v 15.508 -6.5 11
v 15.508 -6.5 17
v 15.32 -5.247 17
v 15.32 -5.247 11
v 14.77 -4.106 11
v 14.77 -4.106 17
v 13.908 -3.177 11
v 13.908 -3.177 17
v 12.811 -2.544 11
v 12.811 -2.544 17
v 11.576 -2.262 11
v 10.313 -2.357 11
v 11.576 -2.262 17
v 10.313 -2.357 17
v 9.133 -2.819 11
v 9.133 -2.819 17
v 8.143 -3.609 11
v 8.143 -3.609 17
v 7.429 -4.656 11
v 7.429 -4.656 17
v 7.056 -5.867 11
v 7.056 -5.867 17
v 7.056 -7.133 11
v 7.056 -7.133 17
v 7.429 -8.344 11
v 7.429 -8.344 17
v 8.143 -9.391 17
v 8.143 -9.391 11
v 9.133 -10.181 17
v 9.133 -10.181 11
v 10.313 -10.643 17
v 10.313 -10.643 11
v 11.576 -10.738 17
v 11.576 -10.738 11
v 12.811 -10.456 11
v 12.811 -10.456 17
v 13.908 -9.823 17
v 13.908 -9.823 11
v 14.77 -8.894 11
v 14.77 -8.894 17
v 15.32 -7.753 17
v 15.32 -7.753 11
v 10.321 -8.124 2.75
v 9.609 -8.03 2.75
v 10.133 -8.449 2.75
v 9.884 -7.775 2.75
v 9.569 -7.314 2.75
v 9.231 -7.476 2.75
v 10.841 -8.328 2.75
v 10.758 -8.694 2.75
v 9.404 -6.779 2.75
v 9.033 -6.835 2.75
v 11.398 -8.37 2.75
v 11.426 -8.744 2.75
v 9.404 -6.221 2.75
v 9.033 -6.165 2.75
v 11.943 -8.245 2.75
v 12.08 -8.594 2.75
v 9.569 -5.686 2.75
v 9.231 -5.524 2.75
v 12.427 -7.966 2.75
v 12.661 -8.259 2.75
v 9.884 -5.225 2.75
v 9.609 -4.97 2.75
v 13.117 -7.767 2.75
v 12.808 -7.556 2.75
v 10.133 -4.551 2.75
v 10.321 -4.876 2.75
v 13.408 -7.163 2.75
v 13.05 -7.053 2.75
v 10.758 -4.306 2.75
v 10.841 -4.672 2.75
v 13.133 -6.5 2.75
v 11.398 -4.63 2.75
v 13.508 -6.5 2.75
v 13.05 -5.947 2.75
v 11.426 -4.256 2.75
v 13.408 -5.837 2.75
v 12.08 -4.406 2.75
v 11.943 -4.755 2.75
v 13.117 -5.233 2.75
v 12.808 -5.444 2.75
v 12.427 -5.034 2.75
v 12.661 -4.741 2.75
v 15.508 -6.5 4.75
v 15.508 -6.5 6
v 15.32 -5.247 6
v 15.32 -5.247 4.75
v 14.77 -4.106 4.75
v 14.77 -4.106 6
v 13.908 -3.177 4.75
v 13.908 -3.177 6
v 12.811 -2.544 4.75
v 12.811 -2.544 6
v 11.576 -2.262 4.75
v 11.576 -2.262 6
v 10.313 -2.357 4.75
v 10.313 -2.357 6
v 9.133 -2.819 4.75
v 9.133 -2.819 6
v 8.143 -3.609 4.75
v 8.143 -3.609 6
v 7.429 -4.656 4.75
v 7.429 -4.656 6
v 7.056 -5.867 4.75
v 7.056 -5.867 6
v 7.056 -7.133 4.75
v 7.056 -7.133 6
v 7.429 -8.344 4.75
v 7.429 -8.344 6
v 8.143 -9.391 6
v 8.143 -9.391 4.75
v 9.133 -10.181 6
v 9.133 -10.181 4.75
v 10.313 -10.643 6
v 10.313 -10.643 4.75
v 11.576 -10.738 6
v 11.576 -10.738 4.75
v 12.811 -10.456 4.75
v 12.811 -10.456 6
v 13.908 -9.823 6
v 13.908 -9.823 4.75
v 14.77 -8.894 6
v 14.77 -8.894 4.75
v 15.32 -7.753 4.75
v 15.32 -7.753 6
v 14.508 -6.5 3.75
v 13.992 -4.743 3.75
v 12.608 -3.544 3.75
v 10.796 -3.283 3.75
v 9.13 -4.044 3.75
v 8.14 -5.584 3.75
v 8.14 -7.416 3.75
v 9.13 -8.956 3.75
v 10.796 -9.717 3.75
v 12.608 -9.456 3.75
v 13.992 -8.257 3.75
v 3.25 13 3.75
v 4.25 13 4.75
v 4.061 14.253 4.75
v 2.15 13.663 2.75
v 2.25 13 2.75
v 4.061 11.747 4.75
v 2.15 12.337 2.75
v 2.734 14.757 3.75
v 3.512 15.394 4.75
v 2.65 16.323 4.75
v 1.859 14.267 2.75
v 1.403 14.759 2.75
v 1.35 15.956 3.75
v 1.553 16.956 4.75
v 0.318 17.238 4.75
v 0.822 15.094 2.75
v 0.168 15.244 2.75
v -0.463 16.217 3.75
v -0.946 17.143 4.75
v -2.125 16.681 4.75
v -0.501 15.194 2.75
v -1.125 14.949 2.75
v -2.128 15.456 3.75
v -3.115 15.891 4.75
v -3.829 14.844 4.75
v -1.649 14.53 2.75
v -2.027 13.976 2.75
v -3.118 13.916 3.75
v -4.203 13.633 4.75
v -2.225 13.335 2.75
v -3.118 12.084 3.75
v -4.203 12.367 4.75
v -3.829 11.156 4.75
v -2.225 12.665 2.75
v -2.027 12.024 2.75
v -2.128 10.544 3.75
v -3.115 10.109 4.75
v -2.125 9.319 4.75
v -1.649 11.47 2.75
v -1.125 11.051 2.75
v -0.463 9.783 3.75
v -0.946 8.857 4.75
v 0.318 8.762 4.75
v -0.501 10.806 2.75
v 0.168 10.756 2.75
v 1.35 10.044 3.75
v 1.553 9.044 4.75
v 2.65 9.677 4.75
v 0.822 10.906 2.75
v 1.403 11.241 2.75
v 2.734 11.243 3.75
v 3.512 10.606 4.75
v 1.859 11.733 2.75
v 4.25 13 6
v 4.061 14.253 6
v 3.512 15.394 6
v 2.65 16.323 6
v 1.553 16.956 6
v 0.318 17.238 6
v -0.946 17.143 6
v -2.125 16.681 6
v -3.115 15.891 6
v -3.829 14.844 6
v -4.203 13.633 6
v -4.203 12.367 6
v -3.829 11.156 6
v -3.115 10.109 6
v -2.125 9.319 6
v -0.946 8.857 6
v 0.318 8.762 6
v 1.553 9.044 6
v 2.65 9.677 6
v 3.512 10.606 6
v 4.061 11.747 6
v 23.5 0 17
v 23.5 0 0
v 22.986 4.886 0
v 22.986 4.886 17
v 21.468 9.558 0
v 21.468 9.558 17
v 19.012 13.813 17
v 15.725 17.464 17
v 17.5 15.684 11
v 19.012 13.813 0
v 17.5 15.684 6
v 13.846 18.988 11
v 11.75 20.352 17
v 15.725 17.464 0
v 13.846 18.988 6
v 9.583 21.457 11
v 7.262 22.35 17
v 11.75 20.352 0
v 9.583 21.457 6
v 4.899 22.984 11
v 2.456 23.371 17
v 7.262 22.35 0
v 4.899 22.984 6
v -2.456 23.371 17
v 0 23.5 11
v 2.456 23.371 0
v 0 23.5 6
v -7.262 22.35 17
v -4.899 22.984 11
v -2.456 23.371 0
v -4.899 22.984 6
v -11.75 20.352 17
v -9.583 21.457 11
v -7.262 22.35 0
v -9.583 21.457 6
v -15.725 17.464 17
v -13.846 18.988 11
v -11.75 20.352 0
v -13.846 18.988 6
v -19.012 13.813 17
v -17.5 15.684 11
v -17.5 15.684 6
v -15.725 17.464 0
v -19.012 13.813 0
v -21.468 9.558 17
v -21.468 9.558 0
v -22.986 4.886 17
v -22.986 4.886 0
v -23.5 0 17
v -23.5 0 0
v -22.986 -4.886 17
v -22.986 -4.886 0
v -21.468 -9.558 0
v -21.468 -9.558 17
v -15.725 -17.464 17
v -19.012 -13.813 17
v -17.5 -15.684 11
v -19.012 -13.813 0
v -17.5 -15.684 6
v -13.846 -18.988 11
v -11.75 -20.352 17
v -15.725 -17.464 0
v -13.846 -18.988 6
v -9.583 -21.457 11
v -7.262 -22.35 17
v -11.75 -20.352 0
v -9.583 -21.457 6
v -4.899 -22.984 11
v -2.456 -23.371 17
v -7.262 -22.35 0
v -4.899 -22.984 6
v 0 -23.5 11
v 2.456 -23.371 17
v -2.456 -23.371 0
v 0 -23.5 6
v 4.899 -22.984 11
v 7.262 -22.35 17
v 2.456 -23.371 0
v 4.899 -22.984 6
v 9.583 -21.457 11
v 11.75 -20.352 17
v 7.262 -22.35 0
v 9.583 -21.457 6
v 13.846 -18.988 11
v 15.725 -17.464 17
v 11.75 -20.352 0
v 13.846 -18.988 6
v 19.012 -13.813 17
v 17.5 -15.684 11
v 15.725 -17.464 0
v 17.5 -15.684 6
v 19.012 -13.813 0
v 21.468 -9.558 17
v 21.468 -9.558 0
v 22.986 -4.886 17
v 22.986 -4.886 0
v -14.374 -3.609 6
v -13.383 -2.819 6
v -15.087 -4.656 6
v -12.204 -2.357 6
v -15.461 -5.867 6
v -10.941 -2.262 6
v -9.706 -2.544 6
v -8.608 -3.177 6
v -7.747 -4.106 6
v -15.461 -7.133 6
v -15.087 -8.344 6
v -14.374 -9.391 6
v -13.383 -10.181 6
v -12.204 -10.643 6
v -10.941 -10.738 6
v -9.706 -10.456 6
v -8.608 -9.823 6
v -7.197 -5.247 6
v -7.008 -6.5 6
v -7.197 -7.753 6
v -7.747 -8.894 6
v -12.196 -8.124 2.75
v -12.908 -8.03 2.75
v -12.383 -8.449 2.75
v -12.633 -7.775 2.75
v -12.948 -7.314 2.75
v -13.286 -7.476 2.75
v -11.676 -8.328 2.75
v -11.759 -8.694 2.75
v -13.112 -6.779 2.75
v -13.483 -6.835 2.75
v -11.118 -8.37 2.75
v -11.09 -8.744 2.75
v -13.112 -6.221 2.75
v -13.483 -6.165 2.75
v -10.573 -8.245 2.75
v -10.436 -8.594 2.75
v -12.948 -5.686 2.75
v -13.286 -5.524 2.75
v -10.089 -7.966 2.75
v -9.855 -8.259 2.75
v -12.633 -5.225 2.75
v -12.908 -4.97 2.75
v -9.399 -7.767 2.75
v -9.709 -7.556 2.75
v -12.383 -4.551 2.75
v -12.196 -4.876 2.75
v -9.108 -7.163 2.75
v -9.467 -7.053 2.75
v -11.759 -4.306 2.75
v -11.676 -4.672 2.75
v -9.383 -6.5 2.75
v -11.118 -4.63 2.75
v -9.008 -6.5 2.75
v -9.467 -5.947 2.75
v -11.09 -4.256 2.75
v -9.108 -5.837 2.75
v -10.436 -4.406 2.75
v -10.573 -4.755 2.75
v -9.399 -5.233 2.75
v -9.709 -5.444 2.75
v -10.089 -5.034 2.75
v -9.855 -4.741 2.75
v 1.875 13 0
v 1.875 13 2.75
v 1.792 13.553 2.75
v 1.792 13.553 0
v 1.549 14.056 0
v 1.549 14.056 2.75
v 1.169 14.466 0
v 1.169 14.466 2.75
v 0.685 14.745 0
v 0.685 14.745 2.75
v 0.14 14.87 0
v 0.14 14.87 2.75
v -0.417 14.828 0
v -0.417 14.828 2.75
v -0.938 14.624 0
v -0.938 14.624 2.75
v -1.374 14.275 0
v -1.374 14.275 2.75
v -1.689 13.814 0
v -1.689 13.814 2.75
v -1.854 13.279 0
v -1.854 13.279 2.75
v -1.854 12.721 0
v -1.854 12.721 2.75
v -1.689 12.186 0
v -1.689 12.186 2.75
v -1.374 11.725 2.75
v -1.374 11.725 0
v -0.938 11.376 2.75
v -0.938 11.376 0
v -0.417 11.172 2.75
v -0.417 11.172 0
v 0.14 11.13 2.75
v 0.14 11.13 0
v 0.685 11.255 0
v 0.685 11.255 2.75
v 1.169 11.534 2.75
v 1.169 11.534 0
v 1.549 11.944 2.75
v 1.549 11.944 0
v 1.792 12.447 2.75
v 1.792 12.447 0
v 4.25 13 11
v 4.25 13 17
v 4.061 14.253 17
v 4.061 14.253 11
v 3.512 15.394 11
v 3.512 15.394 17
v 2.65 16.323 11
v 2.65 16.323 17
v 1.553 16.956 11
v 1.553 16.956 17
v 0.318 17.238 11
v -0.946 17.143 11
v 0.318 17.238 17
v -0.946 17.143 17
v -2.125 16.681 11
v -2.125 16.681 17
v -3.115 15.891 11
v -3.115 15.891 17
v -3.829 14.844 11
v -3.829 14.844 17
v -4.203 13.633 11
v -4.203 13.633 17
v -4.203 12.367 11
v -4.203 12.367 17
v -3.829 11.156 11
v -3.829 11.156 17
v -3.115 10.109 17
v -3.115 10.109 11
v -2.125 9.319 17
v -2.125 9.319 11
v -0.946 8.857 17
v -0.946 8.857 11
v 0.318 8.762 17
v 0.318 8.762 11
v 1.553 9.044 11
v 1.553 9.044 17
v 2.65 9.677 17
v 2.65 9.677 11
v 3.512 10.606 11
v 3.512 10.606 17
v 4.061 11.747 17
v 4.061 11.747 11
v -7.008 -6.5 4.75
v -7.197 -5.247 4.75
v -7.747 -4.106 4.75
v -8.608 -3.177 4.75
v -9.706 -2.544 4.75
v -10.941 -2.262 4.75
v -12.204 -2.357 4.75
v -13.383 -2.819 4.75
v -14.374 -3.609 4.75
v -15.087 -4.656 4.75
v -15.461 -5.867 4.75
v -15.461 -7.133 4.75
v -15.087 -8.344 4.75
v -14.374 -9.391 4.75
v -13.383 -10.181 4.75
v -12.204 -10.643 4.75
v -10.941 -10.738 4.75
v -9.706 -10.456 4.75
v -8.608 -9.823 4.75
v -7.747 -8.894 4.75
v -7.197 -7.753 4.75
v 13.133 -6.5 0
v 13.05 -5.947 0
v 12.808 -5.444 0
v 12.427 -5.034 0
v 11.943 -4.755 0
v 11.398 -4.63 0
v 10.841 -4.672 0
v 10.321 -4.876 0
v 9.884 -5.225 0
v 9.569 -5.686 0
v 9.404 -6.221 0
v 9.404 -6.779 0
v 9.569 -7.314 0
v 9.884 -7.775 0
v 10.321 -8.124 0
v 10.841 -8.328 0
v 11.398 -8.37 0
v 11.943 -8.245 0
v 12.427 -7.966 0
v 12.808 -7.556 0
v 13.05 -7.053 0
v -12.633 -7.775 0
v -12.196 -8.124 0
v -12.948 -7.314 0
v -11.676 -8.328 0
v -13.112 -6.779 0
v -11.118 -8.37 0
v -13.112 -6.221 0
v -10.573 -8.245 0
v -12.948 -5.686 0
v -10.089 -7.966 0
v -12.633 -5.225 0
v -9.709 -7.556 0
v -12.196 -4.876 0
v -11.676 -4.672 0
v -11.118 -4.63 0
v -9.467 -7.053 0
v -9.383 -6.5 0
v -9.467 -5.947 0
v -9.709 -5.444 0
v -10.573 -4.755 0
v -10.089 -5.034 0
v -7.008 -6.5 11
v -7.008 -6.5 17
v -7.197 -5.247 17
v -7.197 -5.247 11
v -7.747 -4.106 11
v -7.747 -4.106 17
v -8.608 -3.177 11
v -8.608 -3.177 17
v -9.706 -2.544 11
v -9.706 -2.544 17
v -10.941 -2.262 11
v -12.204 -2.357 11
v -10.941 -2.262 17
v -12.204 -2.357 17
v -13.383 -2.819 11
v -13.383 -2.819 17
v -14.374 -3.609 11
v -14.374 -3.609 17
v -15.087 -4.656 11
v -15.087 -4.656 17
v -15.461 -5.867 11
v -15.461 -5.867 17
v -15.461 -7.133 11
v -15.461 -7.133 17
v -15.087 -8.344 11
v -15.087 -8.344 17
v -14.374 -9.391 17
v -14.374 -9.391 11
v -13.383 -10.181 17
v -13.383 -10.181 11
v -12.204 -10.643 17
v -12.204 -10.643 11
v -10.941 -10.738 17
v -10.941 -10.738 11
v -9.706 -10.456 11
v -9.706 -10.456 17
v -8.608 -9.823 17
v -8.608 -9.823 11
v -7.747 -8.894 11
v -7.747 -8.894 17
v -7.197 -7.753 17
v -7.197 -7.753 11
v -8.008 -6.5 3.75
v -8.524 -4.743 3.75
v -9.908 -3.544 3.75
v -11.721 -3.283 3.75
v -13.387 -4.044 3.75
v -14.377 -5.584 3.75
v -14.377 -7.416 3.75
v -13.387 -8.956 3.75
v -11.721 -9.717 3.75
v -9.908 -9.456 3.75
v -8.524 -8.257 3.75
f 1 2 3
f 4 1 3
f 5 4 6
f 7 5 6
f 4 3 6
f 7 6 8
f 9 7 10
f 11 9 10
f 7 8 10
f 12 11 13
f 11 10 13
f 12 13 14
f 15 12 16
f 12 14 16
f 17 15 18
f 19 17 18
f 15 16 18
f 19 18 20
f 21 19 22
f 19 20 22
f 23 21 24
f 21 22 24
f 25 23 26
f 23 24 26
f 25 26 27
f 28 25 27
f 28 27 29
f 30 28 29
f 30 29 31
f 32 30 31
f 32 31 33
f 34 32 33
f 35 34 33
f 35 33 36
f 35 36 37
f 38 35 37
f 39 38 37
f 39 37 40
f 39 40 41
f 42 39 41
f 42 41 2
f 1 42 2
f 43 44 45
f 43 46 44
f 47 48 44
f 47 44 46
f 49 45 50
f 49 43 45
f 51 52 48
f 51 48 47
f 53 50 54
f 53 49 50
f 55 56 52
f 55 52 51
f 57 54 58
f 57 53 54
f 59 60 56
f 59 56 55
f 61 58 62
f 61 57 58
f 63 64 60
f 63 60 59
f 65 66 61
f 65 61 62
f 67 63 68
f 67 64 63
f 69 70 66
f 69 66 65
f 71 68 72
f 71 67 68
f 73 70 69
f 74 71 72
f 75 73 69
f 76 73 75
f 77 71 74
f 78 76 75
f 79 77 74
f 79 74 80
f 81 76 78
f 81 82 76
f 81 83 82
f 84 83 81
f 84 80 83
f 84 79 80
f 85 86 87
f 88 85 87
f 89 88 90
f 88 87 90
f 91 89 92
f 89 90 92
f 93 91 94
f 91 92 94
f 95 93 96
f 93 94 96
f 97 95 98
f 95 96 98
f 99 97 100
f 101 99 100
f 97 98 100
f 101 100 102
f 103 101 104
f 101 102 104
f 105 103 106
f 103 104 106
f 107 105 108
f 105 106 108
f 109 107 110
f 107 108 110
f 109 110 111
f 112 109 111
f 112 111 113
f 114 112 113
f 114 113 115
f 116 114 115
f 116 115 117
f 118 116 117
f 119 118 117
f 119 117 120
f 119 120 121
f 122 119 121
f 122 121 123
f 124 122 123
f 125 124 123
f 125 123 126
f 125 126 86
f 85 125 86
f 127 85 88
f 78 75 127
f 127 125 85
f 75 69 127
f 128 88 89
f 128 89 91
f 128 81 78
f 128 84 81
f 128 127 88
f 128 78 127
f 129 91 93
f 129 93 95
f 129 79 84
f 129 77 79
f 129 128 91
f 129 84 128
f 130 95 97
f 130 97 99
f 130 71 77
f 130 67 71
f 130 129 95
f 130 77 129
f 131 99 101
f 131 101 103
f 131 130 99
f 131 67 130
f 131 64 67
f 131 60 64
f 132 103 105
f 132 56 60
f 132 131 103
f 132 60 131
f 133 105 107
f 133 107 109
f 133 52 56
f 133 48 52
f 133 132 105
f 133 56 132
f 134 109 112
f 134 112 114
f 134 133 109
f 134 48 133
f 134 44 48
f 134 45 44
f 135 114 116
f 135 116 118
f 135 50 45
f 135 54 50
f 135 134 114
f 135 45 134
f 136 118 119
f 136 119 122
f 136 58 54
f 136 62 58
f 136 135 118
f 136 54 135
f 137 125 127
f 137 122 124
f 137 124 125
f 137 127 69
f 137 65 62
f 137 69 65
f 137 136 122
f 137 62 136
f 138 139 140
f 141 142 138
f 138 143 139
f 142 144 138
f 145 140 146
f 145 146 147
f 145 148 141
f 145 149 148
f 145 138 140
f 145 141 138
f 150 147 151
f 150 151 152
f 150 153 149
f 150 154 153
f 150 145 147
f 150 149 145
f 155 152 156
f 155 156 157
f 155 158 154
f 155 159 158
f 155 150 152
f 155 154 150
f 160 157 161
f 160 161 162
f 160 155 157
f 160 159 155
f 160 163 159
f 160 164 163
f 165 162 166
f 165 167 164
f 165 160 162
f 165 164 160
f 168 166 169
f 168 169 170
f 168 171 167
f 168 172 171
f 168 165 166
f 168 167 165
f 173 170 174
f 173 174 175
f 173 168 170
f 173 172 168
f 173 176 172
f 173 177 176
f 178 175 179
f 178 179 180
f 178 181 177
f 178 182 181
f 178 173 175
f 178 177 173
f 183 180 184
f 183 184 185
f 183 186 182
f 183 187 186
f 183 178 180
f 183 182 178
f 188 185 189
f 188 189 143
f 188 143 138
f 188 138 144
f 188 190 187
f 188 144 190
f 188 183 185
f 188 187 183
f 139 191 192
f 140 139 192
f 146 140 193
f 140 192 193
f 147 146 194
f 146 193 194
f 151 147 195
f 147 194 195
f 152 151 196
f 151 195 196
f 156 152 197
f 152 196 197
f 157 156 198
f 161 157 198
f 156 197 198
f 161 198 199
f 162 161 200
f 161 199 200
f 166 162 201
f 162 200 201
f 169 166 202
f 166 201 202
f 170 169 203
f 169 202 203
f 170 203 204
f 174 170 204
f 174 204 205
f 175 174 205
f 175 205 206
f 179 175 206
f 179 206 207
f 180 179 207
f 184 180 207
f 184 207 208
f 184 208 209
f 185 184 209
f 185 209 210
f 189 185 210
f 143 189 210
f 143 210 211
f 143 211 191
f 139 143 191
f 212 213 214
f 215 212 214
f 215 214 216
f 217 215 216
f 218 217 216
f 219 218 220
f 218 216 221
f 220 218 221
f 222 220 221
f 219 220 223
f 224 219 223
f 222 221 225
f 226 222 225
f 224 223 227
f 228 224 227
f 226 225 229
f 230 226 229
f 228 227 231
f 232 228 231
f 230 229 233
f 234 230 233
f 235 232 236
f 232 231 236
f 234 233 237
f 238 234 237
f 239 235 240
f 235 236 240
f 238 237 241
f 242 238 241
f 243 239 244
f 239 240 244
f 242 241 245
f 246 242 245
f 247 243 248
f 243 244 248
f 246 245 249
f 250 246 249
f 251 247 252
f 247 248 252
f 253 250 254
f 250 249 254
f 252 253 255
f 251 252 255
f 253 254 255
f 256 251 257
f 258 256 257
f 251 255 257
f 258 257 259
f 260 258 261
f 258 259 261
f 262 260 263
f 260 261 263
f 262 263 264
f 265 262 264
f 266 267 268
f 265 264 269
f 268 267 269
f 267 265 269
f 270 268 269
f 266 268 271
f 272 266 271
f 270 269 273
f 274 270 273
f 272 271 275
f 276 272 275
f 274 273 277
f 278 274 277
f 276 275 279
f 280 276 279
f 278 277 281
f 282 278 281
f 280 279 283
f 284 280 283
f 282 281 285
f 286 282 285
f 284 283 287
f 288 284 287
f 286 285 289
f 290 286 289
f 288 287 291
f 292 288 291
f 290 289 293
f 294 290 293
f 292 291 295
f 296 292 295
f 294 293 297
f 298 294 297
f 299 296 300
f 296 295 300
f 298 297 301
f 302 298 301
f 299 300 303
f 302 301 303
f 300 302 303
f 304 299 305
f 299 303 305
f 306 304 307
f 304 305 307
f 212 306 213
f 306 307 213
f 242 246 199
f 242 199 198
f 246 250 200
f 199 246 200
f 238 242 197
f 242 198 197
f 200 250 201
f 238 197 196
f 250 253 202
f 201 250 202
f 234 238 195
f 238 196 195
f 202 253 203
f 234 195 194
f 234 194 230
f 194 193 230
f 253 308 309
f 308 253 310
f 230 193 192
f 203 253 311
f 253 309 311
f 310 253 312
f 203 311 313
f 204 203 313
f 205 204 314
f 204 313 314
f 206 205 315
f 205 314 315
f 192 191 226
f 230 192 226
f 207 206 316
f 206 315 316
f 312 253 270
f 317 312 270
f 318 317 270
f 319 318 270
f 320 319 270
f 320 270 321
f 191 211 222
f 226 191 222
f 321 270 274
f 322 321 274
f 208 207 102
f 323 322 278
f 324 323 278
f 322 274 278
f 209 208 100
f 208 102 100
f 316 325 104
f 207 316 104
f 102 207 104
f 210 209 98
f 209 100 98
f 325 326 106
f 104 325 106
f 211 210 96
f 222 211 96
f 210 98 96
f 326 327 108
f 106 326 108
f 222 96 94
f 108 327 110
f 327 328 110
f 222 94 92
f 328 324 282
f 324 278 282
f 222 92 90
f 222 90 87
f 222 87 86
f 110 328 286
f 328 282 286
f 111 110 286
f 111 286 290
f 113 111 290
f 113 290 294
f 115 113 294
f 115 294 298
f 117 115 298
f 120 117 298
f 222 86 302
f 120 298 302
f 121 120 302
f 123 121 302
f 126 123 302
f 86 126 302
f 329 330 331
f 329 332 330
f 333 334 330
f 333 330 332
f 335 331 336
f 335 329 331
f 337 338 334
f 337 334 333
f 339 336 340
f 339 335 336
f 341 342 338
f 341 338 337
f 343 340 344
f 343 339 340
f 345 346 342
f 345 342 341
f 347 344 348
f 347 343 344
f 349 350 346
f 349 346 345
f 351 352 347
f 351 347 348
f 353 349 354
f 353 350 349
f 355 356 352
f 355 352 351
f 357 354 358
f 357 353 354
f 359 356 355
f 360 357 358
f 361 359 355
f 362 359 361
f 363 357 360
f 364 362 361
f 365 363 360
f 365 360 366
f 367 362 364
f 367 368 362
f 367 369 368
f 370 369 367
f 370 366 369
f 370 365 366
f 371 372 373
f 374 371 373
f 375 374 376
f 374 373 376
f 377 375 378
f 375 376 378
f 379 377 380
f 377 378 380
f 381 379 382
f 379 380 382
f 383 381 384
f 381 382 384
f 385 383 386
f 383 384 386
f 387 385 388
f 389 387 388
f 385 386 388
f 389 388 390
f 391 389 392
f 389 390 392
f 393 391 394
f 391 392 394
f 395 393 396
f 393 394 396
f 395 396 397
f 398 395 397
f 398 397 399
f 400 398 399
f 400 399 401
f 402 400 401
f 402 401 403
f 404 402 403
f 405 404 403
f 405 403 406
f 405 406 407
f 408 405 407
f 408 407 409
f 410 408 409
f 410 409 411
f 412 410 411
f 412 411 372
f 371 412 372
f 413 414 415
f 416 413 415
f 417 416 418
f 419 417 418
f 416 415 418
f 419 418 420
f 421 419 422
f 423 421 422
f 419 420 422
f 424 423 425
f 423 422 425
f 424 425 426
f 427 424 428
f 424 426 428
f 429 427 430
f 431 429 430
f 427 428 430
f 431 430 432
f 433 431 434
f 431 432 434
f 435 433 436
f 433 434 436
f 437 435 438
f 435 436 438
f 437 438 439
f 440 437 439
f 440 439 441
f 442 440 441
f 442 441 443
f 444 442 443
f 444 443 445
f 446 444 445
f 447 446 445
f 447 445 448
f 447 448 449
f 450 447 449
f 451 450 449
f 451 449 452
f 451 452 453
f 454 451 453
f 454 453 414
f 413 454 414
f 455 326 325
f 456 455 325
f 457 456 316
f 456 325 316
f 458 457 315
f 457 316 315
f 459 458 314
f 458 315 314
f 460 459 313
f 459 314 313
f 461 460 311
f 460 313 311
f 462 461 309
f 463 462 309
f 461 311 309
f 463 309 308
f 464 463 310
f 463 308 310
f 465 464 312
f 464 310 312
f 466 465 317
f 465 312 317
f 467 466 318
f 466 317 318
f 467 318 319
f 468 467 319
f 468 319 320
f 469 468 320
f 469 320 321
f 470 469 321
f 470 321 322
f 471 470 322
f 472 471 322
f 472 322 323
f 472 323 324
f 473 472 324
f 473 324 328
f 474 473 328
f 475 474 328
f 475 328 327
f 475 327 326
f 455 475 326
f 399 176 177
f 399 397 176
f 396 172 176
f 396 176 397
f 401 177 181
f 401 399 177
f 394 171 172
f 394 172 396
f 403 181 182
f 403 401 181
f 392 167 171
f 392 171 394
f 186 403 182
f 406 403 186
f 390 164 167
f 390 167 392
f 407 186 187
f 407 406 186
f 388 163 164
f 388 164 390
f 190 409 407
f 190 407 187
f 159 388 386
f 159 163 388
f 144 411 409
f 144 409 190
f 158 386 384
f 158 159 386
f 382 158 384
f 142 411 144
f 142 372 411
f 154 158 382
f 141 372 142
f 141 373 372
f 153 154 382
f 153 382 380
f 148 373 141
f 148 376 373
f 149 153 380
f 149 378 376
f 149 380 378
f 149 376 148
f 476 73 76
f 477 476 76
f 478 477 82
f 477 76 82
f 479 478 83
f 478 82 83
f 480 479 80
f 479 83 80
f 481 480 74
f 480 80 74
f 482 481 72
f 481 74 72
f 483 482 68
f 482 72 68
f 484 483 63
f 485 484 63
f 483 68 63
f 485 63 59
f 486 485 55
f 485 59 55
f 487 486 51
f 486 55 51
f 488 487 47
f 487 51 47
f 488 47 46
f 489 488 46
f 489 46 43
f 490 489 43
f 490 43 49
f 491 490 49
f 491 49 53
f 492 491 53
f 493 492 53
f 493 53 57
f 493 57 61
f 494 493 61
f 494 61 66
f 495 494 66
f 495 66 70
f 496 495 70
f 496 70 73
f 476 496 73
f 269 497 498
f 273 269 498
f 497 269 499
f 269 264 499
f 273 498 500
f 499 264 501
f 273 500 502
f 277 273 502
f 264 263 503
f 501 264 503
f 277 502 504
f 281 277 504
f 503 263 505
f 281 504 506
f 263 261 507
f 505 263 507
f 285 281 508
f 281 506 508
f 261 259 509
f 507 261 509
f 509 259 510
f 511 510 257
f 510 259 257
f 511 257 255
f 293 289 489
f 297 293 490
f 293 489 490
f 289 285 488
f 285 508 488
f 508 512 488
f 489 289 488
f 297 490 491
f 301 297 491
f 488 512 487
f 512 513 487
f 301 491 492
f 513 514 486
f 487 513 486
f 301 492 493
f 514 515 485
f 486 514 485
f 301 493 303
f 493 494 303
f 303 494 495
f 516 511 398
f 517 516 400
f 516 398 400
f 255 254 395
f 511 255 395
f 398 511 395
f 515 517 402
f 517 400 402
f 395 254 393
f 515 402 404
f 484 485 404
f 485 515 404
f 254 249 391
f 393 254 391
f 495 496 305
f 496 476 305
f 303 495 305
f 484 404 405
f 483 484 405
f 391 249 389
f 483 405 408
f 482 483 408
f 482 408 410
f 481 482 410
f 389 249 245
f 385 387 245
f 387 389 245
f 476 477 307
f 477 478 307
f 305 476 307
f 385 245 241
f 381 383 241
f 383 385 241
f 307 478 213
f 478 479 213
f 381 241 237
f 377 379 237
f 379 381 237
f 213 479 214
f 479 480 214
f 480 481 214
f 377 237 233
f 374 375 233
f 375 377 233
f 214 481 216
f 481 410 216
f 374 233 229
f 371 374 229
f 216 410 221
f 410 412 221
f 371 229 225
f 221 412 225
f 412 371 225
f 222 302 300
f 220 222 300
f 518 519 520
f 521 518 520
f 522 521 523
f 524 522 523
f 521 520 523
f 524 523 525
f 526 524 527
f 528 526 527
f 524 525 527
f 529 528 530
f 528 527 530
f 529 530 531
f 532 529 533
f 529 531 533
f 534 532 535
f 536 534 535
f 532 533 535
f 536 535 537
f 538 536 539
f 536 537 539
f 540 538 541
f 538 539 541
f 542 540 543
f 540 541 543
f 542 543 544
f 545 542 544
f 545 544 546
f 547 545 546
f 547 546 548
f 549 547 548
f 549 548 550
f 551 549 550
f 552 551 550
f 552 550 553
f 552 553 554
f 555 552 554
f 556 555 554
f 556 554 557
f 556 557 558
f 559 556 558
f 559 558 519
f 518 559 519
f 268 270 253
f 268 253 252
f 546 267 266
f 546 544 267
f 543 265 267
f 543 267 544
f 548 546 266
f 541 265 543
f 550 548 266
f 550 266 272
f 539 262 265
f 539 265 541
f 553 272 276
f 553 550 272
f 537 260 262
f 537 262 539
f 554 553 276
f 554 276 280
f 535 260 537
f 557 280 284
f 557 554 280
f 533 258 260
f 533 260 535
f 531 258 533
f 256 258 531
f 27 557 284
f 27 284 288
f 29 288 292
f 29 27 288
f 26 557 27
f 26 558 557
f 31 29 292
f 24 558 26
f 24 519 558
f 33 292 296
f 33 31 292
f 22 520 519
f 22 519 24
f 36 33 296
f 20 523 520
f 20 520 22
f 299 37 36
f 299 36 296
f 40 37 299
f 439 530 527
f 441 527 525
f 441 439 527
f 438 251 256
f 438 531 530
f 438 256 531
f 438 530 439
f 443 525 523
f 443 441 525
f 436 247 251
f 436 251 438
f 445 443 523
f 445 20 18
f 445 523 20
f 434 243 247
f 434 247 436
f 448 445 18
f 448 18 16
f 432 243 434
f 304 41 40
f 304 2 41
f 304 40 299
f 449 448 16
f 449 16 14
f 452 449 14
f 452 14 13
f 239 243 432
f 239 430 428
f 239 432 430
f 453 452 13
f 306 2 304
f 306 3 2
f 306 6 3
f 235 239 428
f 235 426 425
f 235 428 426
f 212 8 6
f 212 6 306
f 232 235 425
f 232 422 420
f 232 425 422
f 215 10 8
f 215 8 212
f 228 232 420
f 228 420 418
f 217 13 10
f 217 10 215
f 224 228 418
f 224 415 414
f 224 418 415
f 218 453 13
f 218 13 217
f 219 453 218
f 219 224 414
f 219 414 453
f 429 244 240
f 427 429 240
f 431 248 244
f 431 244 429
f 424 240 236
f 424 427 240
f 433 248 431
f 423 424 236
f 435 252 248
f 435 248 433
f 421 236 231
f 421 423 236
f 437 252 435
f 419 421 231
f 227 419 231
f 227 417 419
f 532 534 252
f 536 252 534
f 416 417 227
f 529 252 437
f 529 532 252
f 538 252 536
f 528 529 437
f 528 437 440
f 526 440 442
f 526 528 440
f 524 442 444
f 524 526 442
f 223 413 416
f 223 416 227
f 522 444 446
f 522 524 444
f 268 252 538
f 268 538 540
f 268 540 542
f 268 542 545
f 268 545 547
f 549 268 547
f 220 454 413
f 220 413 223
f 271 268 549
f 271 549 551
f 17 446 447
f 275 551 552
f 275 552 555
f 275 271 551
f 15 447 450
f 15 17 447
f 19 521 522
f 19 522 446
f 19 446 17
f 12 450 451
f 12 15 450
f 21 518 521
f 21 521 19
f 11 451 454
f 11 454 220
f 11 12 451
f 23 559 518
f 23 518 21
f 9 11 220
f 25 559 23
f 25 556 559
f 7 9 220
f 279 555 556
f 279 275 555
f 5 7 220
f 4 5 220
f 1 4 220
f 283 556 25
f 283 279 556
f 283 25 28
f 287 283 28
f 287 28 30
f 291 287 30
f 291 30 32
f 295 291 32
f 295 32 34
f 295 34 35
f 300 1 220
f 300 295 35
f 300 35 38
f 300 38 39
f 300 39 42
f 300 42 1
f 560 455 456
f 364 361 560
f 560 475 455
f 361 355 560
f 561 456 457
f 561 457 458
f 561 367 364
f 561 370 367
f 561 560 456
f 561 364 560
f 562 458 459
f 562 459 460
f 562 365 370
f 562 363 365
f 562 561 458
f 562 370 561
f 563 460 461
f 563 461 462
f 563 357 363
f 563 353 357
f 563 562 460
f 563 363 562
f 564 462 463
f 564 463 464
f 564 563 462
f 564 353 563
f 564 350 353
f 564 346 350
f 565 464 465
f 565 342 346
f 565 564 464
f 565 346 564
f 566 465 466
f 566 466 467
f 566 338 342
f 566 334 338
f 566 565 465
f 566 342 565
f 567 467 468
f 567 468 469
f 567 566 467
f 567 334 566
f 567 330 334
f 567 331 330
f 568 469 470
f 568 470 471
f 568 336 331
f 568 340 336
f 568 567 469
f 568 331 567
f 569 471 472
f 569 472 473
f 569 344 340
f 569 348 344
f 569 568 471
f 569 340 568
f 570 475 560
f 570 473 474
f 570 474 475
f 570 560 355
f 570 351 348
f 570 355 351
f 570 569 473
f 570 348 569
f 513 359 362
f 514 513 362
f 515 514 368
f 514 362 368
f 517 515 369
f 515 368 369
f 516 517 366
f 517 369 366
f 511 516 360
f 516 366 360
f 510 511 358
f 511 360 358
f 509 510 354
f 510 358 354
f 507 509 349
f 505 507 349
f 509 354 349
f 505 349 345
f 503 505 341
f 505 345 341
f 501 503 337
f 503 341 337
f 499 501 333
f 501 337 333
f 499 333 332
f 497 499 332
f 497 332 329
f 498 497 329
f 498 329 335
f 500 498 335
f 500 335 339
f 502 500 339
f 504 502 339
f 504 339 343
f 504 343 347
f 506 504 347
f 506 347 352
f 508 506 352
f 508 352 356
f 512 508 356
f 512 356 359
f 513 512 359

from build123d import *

# Parameters (mm, degrees)
F0_R     = 23.5
F1_DEPTH = 17
F2_W     = 35
F2_H     = 5
F3_DEPTH = 28.6
F4_R     = 1.875
F5_DEPTH = 17.001
F6_R     = 4.25
F7_DEPTH = 14.25
F8_SIZE  = 2


with BuildPart() as f1:
    # F0 (on Top) → F1 (new body)
    with BuildSketch(Plane.XY):
        Circle(F0_R)
    extrude(amount=F1_DEPTH)

    # F2 (on Front) → F3 (cut, symmetric)
    with BuildSketch(Plane.XZ):
        with Locations((0, 8.5)):
            Rectangle(F2_W, F2_H)
    extrude(amount=F3_DEPTH, both=True, mode=Mode.SUBTRACT)

    # F4 (on face) → F5 (cut, through all)
    with BuildSketch(Plane.XY.offset(17)):
        with Locations((0, 13)):
            Circle(F4_R)
        with Locations((-11.25833, -6.5)):
            Circle(F4_R)
        with Locations((11.25833, -6.5)):
            Circle(F4_R)
    extrude(amount=-F5_DEPTH, mode=Mode.SUBTRACT)

    # F6 (on face) → F7 (cut)
    with BuildSketch(Plane.XY.offset(17)):
        with Locations((0, 13)):
            Circle(F6_R)
        with Locations((-11.25833, -6.5)):
            Circle(F6_R)
        with Locations((11.25833, -6.5)):
            Circle(F6_R)
    extrude(amount=-F7_DEPTH, mode=Mode.SUBTRACT)

    # F8
    f8_edges = [f1.edges().sort_by_distance(p)[0] for p in [
        (-15.50833, -6.5, 2.75),
        (7.00833, -6.5, 2.75),
        (-4.25, 13, 2.75),
    ]]
    chamfer(f8_edges, length=F8_SIZE)


solid = f1.part
